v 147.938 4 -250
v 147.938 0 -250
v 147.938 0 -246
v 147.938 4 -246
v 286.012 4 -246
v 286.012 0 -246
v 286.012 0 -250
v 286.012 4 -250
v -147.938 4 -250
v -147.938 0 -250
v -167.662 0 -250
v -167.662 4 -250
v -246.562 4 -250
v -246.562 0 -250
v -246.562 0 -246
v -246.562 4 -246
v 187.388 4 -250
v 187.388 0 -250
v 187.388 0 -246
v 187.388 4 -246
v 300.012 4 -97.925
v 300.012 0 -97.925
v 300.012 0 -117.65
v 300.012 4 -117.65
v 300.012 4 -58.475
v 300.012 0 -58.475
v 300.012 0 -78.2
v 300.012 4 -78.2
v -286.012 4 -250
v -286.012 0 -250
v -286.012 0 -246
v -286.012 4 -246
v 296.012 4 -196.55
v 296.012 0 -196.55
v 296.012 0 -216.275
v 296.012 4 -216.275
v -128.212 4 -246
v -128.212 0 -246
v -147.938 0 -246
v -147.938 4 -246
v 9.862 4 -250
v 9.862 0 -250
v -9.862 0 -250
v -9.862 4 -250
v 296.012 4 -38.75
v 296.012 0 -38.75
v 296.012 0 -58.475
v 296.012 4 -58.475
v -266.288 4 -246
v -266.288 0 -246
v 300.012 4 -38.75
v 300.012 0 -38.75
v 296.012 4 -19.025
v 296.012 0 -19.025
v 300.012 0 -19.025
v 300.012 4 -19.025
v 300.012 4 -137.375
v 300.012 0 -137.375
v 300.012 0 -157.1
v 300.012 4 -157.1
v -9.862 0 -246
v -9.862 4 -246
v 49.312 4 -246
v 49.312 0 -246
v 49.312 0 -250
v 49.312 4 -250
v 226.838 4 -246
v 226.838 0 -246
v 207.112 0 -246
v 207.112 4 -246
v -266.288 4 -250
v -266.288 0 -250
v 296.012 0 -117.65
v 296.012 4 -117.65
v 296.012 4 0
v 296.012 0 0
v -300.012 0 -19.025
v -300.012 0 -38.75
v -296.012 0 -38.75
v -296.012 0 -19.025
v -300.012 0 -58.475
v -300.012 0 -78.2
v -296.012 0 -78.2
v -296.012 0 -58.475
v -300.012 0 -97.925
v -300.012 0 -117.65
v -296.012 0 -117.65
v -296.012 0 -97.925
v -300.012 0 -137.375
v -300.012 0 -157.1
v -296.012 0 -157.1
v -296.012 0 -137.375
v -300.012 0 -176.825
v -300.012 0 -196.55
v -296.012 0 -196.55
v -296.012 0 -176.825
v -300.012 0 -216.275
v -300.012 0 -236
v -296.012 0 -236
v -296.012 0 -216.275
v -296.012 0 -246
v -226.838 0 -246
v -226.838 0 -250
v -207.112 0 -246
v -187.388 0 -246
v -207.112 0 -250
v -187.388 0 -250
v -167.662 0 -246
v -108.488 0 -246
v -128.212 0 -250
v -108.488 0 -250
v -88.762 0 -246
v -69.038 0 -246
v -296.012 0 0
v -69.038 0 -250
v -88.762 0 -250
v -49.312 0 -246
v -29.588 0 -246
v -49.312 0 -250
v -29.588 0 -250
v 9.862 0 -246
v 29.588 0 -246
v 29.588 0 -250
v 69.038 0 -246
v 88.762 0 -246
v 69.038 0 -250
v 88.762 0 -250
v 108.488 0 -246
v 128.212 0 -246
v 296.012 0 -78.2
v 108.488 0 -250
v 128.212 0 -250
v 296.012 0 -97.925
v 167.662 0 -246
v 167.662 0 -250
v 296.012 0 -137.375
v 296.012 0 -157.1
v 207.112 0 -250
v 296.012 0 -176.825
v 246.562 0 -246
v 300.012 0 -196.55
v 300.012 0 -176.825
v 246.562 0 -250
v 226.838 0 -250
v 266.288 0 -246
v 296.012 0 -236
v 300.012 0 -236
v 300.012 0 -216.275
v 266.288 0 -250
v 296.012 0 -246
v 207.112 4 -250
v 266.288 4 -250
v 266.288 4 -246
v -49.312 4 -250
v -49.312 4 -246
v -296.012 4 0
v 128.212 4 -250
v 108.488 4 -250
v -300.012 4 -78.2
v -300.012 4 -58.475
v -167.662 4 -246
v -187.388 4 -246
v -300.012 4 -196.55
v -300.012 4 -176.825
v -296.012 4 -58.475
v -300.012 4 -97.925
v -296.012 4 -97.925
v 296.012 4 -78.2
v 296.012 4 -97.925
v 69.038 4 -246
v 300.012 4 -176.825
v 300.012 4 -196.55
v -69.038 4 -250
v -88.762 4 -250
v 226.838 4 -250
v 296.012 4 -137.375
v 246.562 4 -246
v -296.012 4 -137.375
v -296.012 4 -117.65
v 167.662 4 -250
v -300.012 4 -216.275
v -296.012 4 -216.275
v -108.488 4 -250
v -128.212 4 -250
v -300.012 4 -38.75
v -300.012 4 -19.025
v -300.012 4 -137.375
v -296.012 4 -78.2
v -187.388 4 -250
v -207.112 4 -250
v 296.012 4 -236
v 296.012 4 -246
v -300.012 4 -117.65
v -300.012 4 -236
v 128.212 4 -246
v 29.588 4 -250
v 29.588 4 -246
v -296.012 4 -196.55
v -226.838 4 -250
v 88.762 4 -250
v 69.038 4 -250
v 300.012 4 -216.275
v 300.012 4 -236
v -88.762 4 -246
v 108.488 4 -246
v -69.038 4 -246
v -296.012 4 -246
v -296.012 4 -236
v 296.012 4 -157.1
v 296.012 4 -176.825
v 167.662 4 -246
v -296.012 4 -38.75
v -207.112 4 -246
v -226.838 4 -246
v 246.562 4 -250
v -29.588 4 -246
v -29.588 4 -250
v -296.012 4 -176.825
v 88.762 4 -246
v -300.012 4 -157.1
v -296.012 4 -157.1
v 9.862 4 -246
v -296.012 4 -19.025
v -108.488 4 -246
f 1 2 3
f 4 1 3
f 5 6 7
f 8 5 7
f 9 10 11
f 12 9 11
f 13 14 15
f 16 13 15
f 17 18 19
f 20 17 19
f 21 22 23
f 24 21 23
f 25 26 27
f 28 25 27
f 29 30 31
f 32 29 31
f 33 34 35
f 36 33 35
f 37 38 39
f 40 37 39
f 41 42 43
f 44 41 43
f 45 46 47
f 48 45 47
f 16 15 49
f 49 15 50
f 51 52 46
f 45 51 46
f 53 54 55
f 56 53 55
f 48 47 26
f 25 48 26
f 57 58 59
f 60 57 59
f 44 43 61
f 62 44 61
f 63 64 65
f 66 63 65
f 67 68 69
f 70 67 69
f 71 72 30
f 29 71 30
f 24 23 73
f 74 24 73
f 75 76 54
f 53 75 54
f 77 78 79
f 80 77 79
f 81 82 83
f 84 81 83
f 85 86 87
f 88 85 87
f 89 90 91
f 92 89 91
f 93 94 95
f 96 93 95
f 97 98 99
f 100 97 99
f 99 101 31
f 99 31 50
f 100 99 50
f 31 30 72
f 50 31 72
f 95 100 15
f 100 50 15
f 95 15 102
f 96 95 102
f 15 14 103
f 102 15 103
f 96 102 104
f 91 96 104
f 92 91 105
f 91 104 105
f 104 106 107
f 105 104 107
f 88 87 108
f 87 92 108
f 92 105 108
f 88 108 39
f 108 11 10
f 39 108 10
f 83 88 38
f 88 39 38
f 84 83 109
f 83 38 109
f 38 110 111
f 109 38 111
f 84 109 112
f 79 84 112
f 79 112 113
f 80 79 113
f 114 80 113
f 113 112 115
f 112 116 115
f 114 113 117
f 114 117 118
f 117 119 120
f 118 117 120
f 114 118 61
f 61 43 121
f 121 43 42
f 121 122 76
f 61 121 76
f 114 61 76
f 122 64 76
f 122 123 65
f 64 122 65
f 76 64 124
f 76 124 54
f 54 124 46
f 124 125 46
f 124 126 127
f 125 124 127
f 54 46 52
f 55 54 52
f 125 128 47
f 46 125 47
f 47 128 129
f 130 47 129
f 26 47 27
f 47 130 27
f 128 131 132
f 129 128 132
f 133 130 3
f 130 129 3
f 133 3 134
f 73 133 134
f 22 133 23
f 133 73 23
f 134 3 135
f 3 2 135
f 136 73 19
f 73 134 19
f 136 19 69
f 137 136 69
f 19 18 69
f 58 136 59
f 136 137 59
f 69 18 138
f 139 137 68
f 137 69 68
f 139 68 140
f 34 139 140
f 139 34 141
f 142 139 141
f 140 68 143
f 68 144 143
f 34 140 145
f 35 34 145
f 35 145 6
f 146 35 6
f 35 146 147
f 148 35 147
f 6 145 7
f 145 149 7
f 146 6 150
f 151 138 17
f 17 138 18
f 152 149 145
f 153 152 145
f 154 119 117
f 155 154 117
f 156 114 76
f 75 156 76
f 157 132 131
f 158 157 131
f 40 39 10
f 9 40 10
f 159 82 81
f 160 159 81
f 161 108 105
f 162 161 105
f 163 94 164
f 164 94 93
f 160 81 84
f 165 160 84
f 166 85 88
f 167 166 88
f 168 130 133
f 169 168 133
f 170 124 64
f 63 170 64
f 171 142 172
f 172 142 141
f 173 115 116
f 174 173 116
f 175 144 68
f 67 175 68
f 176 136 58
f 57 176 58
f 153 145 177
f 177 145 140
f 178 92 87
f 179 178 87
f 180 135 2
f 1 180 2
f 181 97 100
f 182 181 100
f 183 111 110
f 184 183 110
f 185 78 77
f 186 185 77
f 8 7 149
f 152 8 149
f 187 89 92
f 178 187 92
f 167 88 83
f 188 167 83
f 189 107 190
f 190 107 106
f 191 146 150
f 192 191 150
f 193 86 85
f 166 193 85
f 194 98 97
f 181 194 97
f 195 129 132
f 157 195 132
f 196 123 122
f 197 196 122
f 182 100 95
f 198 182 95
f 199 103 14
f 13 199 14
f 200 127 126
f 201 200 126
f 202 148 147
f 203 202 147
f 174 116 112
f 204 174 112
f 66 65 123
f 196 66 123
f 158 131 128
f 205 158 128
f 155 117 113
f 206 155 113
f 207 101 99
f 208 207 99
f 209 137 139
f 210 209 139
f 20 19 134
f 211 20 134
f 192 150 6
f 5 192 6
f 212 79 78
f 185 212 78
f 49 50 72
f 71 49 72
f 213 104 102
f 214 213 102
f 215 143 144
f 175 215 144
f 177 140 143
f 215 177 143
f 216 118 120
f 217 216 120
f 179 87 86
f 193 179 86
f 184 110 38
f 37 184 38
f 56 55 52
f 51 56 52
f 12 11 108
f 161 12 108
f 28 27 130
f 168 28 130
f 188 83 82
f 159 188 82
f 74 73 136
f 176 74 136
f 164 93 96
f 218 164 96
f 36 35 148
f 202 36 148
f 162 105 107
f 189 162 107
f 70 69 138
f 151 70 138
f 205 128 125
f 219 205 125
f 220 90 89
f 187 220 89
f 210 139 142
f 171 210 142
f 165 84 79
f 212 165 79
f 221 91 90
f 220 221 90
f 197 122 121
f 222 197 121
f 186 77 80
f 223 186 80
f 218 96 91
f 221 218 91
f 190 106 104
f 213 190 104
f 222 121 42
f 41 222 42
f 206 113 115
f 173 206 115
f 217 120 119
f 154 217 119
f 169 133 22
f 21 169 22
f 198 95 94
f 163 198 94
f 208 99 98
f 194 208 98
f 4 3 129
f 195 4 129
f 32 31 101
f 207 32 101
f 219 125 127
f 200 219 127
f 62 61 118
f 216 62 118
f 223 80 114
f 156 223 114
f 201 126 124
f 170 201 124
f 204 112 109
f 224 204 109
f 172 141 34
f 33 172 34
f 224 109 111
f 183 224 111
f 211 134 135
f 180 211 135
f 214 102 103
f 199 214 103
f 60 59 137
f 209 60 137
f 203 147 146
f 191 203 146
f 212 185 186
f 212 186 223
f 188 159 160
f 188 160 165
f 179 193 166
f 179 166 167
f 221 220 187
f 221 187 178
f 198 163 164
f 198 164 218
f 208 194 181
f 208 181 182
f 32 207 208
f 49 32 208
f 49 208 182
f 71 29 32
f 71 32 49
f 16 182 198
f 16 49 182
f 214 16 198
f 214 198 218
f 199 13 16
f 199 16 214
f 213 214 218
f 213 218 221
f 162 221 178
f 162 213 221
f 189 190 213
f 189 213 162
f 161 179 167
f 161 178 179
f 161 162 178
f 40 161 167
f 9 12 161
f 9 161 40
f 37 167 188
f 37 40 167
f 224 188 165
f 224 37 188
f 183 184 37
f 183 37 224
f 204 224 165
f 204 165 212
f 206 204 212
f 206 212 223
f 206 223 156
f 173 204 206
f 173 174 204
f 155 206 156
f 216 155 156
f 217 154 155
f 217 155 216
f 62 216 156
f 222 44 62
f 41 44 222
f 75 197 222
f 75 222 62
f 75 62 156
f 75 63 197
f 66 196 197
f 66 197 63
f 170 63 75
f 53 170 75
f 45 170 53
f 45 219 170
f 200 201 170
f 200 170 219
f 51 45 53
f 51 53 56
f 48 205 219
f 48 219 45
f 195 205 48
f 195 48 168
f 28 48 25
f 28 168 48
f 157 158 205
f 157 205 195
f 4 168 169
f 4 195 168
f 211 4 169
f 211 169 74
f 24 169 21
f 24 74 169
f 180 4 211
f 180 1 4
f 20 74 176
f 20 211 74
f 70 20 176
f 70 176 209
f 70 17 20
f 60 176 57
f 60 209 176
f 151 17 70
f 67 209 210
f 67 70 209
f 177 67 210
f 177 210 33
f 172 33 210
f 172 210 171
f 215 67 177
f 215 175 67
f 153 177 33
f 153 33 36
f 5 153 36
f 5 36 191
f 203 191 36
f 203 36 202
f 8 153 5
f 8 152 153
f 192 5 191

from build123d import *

# Parameters (mm, degrees)
BOSS_EXTRUDE1_DEPTH = 4


with BuildPart() as part:
    # Sketch1 → Boss-Extrude1 (new body)
    with BuildSketch(Plane(origin=(0, 0, 0), x_dir=(1, 0, 0), z_dir=(0, 1, 0))):
        Polygon((9.8625, 250), (-9.8625, 250), (-9.8625, 246), (-29.5875, 246), (-29.5875, 250), (-49.3125, 250), (-49.3125, 246), (-69.0375, 246), (-69.0375, 250), (-88.7625, 250), (-88.7625, 246), (-108.4875, 246), (-108.4875, 250), (-128.2125, 250), (-128.2125, 246), (-147.9375, 246), (-147.9375, 250), (-167.6625, 250), (-167.6625, 246), (-187.3875, 246), (-187.3875, 250), (-207.1125, 250), (-207.1125, 246), (-226.8375, 246), (-226.8375, 250), (-246.5625, 250), (-246.5625, 246), (-266.2875, 246), (-266.2875, 250), (-286.0125, 250), (-286.0125, 246), (-296.0125, 246), (-296.0125, 236), (-300.0125, 236), (-300.0125, 216.275), (-296.0125, 216.275), (-296.0125, 196.55), (-300.0125, 196.55), (-300.0125, 176.825), (-296.0125, 176.825), (-296.0125, 157.1), (-300.0125, 157.1), (-300.0125, 137.375), (-296.0125, 137.375), (-296.0125, 117.65), (-300.0125, 117.65), (-300.0125, 97.925), (-296.0125, 97.925), (-296.0125, 78.2), (-300.0125, 78.2), (-300.0125, 58.475), (-296.0125, 58.475), (-296.0125, 38.75), (-300.0125, 38.75), (-300.0125, 19.025), (-296.0125, 19.025), (-296.0125, 0), (296.0125, 0), (296.0125, 19.025), (300.0125, 19.025), (300.0125, 38.75), (296.0125, 38.75), (296.0125, 58.475), (300.0125, 58.475), (300.0125, 78.2), (296.0125, 78.2), (296.0125, 97.925), (300.0125, 97.925), (300.0125, 117.65), (296.0125, 117.65), (296.0125, 137.375), (300.0125, 137.375), (300.0125, 157.1), (296.0125, 157.1), (296.0125, 176.825), (300.0125, 176.825), (300.0125, 196.55), (296.0125, 196.55), (296.0125, 216.275), (300.0125, 216.275), (300.0125, 236), (296.0125, 236), (296.0125, 246), (286.0125, 246), (286.0125, 250), (266.2875, 250), (266.2875, 246), (246.5625, 246), (246.5625, 250), (226.8375, 250), (226.8375, 246), (207.1125, 246), (207.1125, 250), (187.3875, 250), (187.3875, 246), (167.6625, 246), (167.6625, 250), (147.9375, 250), (147.9375, 246), (128.2125, 246), (128.2125, 250), (108.4875, 250), (108.4875, 246), (88.7625, 246), (88.7625, 250), (69.0375, 250), (69.0375, 246), (49.3125, 246), (49.3125, 250), (29.5875, 250), (29.5875, 246), (9.8625, 246), align=None)
    extrude(amount=BOSS_EXTRUDE1_DEPTH)


solid = part.part
